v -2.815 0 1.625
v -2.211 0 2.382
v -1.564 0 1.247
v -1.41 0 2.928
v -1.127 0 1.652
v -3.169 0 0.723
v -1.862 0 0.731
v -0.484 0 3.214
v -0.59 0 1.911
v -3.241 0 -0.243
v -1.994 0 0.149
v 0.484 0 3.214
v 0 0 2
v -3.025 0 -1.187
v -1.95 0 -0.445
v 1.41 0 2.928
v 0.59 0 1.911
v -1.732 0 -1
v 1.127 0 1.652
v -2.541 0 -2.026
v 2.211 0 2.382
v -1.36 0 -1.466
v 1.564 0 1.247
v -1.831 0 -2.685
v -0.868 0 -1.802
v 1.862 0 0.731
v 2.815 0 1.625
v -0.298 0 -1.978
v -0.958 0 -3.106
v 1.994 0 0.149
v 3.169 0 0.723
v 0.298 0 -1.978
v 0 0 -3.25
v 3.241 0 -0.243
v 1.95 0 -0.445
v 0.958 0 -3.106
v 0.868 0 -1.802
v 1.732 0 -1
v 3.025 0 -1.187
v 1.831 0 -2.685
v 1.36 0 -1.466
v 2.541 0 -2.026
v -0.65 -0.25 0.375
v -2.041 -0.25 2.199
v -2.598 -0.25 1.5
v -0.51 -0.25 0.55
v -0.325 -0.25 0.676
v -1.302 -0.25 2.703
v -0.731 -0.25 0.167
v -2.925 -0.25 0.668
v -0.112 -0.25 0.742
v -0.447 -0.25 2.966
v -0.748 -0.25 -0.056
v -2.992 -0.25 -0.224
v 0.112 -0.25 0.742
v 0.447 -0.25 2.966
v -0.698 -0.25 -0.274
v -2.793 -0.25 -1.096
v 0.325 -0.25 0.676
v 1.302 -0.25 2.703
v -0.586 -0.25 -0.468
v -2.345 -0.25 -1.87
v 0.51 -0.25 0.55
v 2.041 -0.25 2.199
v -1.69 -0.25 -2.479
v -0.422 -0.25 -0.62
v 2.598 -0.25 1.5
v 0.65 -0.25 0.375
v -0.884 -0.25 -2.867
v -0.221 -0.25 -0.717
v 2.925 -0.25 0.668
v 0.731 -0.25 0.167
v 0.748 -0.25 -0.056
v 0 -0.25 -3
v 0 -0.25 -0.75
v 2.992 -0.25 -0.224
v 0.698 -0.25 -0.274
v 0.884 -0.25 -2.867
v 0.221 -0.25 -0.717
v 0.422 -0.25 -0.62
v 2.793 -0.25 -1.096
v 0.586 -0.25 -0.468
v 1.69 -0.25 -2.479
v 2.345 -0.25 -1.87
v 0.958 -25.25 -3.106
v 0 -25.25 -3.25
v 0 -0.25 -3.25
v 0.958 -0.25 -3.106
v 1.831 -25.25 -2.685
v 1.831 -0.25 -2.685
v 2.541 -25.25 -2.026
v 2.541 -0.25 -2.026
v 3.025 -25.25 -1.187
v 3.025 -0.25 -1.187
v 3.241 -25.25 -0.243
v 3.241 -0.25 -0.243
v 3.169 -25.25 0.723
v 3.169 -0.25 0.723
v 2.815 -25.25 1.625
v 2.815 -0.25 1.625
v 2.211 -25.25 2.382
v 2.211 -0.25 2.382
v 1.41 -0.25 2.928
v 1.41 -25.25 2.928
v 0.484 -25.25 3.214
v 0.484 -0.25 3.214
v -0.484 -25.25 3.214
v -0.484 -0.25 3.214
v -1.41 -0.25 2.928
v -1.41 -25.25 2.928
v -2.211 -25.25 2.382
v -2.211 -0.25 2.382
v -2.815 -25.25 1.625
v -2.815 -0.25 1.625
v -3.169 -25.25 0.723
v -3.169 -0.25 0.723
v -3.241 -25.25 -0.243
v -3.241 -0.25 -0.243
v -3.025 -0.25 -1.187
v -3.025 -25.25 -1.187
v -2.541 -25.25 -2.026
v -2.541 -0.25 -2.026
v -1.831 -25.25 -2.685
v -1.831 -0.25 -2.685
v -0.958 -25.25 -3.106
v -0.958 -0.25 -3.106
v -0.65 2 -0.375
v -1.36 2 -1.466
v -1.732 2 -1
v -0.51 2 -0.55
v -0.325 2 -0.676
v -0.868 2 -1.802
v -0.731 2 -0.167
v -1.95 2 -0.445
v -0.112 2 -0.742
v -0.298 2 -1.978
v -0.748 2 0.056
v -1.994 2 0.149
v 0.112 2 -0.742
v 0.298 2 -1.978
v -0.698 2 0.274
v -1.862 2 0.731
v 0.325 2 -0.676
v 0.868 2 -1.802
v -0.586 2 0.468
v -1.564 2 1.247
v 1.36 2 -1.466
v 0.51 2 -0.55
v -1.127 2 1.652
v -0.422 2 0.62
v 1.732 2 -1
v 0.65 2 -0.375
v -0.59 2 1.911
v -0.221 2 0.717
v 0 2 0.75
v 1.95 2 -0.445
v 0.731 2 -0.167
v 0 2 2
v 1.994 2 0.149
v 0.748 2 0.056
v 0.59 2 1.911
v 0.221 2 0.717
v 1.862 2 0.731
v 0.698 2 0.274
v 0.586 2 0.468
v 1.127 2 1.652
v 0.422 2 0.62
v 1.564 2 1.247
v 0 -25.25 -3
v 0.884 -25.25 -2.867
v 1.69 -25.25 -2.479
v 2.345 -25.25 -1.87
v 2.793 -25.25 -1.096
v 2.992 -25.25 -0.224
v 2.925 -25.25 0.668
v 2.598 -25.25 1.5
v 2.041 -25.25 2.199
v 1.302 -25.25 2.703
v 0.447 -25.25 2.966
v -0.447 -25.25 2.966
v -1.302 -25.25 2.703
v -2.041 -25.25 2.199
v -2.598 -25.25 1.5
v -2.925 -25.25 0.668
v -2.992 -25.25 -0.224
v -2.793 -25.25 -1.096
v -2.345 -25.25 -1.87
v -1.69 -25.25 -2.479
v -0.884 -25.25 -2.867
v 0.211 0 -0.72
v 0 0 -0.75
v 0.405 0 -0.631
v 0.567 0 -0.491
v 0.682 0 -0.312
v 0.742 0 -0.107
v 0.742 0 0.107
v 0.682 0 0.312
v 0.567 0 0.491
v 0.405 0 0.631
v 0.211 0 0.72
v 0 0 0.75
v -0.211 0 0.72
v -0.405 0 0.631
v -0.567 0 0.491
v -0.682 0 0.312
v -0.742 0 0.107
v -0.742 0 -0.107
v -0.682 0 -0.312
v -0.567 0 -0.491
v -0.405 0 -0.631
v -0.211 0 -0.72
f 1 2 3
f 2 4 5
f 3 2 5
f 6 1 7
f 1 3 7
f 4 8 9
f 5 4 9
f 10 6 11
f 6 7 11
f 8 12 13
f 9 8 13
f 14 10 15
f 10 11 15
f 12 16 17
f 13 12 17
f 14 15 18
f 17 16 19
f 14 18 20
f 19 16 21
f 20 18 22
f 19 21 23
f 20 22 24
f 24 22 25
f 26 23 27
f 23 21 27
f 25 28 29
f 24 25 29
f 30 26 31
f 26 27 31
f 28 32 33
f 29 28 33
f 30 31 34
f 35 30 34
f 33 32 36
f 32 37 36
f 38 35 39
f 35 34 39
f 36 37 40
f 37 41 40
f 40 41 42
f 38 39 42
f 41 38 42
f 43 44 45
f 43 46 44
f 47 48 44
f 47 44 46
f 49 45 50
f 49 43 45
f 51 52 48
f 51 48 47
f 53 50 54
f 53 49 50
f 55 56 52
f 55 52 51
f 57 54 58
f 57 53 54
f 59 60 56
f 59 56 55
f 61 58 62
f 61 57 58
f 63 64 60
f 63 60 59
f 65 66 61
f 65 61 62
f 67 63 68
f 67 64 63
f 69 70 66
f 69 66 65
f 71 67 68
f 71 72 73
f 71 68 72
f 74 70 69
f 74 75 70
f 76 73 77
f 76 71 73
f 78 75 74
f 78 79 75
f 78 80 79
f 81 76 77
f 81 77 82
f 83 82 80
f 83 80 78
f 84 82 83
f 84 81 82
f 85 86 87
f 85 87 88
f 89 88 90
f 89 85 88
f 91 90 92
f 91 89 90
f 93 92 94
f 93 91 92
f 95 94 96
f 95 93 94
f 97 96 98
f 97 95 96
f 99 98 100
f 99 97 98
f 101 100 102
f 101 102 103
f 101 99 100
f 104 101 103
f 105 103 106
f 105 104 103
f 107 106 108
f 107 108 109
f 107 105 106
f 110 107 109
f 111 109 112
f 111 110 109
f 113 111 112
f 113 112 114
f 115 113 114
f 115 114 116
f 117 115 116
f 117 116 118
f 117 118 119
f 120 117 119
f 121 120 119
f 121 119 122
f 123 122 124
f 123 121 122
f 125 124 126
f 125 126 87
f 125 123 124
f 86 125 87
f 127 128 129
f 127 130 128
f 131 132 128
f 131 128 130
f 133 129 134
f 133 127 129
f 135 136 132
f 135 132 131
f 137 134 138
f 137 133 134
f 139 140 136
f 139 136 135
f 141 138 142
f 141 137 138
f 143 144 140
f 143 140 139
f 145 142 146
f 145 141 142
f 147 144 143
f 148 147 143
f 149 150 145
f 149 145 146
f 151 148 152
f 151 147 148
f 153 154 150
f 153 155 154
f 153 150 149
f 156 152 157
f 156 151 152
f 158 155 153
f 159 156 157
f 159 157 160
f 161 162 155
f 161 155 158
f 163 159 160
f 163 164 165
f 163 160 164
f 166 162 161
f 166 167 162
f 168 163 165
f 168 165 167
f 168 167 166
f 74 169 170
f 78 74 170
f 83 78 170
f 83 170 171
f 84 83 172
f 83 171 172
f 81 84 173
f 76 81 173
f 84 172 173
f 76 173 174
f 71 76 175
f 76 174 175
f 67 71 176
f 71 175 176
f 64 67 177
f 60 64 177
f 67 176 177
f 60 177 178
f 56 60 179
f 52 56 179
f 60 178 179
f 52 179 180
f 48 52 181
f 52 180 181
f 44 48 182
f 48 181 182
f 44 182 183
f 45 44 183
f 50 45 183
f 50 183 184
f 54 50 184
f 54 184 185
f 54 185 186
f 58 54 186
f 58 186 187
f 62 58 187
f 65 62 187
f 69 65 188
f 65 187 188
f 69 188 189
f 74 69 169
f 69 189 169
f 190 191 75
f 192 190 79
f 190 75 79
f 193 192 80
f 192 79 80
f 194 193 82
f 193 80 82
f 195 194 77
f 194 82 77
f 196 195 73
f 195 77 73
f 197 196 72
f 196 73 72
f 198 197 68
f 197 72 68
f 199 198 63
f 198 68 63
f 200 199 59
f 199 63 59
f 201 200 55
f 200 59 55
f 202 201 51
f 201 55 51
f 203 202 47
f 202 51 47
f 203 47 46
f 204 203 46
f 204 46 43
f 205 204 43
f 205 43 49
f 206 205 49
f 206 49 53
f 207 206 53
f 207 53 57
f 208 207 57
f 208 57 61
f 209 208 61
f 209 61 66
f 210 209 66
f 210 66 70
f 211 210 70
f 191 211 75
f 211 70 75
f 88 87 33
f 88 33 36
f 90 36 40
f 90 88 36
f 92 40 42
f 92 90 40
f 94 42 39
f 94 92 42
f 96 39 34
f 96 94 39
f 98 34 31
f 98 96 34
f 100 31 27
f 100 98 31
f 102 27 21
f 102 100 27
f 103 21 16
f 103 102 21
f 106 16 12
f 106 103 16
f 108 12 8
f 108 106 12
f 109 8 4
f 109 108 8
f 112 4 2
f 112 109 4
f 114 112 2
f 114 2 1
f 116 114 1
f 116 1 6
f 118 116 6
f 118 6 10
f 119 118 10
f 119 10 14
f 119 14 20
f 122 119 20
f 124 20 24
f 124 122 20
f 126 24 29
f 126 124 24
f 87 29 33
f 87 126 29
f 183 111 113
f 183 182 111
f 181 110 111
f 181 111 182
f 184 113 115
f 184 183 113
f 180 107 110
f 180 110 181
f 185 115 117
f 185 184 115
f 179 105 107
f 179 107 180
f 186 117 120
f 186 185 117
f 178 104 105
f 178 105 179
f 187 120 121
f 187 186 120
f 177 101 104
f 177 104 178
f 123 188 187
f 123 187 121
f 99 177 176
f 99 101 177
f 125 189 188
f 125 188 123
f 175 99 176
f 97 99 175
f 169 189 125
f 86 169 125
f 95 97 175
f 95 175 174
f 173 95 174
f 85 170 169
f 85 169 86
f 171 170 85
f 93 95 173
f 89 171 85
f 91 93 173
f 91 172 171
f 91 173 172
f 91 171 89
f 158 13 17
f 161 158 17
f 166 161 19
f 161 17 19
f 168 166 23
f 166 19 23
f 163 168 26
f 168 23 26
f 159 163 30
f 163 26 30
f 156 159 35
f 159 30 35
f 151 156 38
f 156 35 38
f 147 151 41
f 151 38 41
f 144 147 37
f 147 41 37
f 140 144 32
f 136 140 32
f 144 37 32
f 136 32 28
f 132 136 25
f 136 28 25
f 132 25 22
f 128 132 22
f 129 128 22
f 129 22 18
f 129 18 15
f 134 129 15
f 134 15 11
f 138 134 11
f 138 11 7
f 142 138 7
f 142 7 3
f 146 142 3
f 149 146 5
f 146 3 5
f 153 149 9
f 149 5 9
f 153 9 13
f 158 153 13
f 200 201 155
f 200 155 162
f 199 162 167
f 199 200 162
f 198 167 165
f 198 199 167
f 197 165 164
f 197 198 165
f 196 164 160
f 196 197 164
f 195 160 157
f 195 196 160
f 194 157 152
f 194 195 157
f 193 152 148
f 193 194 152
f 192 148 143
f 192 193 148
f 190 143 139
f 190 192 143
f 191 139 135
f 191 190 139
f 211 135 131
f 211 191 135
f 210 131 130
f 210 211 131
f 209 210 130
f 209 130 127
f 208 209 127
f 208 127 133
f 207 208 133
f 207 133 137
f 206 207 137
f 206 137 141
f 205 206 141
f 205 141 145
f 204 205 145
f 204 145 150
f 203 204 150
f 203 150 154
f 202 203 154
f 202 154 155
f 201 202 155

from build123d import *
from build123d.topology import SkipClean

# Parameters (mm, degrees)
SKETCH1_R           = 2
SKETCH1_R_2         = 0.75
BOSS_EXTRUDE1_DEPTH = 2
BOSS_EXTRUDE2_START = 0.25
SKETCH2_R           = 3.25
SKETCH2_R_2         = 0.75
BOSS_EXTRUDE2_DEPTH = 0.25
BOSS_EXTRUDE3_START = 25
SKETCH3_R           = 3.25
SKETCH3_R_2         = 3
BOSS_EXTRUDE3_DEPTH = 25


with BuildPart() as part:
    # Sketch1 → Boss-Extrude1 (new body)
    with BuildSketch(Plane(origin=(0, 0, 0), x_dir=(1, 0, 0), z_dir=(0, 1, 0))):
        with Locations(Location((0, 0, 0), (0, 0, 270))):
            Circle(SKETCH1_R)
        with Locations(Location((0, 0, 0), (0, 0, 270))):
            Circle(SKETCH1_R_2, mode=Mode.SUBTRACT)
    extrude(amount=BOSS_EXTRUDE1_DEPTH)

    # Sketch2 → Boss-Extrude2 (add)
    with SkipClean():  # the faces are left unmerged after this step: merging them gives an invalid solid
        with BuildSketch(Plane.XZ.offset(BOSS_EXTRUDE2_START)):
            with Locations(Location((0, 0, 0), (0, 0, 270))):
                Circle(SKETCH2_R)
            with Locations(Location((0, 0, 0), (0, 0, 270))):
                Circle(SKETCH2_R_2, mode=Mode.SUBTRACT)
        extrude(amount=-BOSS_EXTRUDE2_DEPTH)

    # Sketch3 → Boss-Extrude3 (add)
    with SkipClean():  # the faces are left unmerged after this step: merging them gives an invalid solid
        with BuildSketch(Plane.XZ.offset(0.25).offset(BOSS_EXTRUDE3_START)):
            with Locations(Location((0, 0, 0), (0, 0, 270))):
                Circle(SKETCH3_R)
            with Locations(Location((0, 0, 0), (0, 0, 270))):
                Circle(SKETCH3_R_2, mode=Mode.SUBTRACT)
        extrude(amount=-BOSS_EXTRUDE3_DEPTH)


solid = part.part
